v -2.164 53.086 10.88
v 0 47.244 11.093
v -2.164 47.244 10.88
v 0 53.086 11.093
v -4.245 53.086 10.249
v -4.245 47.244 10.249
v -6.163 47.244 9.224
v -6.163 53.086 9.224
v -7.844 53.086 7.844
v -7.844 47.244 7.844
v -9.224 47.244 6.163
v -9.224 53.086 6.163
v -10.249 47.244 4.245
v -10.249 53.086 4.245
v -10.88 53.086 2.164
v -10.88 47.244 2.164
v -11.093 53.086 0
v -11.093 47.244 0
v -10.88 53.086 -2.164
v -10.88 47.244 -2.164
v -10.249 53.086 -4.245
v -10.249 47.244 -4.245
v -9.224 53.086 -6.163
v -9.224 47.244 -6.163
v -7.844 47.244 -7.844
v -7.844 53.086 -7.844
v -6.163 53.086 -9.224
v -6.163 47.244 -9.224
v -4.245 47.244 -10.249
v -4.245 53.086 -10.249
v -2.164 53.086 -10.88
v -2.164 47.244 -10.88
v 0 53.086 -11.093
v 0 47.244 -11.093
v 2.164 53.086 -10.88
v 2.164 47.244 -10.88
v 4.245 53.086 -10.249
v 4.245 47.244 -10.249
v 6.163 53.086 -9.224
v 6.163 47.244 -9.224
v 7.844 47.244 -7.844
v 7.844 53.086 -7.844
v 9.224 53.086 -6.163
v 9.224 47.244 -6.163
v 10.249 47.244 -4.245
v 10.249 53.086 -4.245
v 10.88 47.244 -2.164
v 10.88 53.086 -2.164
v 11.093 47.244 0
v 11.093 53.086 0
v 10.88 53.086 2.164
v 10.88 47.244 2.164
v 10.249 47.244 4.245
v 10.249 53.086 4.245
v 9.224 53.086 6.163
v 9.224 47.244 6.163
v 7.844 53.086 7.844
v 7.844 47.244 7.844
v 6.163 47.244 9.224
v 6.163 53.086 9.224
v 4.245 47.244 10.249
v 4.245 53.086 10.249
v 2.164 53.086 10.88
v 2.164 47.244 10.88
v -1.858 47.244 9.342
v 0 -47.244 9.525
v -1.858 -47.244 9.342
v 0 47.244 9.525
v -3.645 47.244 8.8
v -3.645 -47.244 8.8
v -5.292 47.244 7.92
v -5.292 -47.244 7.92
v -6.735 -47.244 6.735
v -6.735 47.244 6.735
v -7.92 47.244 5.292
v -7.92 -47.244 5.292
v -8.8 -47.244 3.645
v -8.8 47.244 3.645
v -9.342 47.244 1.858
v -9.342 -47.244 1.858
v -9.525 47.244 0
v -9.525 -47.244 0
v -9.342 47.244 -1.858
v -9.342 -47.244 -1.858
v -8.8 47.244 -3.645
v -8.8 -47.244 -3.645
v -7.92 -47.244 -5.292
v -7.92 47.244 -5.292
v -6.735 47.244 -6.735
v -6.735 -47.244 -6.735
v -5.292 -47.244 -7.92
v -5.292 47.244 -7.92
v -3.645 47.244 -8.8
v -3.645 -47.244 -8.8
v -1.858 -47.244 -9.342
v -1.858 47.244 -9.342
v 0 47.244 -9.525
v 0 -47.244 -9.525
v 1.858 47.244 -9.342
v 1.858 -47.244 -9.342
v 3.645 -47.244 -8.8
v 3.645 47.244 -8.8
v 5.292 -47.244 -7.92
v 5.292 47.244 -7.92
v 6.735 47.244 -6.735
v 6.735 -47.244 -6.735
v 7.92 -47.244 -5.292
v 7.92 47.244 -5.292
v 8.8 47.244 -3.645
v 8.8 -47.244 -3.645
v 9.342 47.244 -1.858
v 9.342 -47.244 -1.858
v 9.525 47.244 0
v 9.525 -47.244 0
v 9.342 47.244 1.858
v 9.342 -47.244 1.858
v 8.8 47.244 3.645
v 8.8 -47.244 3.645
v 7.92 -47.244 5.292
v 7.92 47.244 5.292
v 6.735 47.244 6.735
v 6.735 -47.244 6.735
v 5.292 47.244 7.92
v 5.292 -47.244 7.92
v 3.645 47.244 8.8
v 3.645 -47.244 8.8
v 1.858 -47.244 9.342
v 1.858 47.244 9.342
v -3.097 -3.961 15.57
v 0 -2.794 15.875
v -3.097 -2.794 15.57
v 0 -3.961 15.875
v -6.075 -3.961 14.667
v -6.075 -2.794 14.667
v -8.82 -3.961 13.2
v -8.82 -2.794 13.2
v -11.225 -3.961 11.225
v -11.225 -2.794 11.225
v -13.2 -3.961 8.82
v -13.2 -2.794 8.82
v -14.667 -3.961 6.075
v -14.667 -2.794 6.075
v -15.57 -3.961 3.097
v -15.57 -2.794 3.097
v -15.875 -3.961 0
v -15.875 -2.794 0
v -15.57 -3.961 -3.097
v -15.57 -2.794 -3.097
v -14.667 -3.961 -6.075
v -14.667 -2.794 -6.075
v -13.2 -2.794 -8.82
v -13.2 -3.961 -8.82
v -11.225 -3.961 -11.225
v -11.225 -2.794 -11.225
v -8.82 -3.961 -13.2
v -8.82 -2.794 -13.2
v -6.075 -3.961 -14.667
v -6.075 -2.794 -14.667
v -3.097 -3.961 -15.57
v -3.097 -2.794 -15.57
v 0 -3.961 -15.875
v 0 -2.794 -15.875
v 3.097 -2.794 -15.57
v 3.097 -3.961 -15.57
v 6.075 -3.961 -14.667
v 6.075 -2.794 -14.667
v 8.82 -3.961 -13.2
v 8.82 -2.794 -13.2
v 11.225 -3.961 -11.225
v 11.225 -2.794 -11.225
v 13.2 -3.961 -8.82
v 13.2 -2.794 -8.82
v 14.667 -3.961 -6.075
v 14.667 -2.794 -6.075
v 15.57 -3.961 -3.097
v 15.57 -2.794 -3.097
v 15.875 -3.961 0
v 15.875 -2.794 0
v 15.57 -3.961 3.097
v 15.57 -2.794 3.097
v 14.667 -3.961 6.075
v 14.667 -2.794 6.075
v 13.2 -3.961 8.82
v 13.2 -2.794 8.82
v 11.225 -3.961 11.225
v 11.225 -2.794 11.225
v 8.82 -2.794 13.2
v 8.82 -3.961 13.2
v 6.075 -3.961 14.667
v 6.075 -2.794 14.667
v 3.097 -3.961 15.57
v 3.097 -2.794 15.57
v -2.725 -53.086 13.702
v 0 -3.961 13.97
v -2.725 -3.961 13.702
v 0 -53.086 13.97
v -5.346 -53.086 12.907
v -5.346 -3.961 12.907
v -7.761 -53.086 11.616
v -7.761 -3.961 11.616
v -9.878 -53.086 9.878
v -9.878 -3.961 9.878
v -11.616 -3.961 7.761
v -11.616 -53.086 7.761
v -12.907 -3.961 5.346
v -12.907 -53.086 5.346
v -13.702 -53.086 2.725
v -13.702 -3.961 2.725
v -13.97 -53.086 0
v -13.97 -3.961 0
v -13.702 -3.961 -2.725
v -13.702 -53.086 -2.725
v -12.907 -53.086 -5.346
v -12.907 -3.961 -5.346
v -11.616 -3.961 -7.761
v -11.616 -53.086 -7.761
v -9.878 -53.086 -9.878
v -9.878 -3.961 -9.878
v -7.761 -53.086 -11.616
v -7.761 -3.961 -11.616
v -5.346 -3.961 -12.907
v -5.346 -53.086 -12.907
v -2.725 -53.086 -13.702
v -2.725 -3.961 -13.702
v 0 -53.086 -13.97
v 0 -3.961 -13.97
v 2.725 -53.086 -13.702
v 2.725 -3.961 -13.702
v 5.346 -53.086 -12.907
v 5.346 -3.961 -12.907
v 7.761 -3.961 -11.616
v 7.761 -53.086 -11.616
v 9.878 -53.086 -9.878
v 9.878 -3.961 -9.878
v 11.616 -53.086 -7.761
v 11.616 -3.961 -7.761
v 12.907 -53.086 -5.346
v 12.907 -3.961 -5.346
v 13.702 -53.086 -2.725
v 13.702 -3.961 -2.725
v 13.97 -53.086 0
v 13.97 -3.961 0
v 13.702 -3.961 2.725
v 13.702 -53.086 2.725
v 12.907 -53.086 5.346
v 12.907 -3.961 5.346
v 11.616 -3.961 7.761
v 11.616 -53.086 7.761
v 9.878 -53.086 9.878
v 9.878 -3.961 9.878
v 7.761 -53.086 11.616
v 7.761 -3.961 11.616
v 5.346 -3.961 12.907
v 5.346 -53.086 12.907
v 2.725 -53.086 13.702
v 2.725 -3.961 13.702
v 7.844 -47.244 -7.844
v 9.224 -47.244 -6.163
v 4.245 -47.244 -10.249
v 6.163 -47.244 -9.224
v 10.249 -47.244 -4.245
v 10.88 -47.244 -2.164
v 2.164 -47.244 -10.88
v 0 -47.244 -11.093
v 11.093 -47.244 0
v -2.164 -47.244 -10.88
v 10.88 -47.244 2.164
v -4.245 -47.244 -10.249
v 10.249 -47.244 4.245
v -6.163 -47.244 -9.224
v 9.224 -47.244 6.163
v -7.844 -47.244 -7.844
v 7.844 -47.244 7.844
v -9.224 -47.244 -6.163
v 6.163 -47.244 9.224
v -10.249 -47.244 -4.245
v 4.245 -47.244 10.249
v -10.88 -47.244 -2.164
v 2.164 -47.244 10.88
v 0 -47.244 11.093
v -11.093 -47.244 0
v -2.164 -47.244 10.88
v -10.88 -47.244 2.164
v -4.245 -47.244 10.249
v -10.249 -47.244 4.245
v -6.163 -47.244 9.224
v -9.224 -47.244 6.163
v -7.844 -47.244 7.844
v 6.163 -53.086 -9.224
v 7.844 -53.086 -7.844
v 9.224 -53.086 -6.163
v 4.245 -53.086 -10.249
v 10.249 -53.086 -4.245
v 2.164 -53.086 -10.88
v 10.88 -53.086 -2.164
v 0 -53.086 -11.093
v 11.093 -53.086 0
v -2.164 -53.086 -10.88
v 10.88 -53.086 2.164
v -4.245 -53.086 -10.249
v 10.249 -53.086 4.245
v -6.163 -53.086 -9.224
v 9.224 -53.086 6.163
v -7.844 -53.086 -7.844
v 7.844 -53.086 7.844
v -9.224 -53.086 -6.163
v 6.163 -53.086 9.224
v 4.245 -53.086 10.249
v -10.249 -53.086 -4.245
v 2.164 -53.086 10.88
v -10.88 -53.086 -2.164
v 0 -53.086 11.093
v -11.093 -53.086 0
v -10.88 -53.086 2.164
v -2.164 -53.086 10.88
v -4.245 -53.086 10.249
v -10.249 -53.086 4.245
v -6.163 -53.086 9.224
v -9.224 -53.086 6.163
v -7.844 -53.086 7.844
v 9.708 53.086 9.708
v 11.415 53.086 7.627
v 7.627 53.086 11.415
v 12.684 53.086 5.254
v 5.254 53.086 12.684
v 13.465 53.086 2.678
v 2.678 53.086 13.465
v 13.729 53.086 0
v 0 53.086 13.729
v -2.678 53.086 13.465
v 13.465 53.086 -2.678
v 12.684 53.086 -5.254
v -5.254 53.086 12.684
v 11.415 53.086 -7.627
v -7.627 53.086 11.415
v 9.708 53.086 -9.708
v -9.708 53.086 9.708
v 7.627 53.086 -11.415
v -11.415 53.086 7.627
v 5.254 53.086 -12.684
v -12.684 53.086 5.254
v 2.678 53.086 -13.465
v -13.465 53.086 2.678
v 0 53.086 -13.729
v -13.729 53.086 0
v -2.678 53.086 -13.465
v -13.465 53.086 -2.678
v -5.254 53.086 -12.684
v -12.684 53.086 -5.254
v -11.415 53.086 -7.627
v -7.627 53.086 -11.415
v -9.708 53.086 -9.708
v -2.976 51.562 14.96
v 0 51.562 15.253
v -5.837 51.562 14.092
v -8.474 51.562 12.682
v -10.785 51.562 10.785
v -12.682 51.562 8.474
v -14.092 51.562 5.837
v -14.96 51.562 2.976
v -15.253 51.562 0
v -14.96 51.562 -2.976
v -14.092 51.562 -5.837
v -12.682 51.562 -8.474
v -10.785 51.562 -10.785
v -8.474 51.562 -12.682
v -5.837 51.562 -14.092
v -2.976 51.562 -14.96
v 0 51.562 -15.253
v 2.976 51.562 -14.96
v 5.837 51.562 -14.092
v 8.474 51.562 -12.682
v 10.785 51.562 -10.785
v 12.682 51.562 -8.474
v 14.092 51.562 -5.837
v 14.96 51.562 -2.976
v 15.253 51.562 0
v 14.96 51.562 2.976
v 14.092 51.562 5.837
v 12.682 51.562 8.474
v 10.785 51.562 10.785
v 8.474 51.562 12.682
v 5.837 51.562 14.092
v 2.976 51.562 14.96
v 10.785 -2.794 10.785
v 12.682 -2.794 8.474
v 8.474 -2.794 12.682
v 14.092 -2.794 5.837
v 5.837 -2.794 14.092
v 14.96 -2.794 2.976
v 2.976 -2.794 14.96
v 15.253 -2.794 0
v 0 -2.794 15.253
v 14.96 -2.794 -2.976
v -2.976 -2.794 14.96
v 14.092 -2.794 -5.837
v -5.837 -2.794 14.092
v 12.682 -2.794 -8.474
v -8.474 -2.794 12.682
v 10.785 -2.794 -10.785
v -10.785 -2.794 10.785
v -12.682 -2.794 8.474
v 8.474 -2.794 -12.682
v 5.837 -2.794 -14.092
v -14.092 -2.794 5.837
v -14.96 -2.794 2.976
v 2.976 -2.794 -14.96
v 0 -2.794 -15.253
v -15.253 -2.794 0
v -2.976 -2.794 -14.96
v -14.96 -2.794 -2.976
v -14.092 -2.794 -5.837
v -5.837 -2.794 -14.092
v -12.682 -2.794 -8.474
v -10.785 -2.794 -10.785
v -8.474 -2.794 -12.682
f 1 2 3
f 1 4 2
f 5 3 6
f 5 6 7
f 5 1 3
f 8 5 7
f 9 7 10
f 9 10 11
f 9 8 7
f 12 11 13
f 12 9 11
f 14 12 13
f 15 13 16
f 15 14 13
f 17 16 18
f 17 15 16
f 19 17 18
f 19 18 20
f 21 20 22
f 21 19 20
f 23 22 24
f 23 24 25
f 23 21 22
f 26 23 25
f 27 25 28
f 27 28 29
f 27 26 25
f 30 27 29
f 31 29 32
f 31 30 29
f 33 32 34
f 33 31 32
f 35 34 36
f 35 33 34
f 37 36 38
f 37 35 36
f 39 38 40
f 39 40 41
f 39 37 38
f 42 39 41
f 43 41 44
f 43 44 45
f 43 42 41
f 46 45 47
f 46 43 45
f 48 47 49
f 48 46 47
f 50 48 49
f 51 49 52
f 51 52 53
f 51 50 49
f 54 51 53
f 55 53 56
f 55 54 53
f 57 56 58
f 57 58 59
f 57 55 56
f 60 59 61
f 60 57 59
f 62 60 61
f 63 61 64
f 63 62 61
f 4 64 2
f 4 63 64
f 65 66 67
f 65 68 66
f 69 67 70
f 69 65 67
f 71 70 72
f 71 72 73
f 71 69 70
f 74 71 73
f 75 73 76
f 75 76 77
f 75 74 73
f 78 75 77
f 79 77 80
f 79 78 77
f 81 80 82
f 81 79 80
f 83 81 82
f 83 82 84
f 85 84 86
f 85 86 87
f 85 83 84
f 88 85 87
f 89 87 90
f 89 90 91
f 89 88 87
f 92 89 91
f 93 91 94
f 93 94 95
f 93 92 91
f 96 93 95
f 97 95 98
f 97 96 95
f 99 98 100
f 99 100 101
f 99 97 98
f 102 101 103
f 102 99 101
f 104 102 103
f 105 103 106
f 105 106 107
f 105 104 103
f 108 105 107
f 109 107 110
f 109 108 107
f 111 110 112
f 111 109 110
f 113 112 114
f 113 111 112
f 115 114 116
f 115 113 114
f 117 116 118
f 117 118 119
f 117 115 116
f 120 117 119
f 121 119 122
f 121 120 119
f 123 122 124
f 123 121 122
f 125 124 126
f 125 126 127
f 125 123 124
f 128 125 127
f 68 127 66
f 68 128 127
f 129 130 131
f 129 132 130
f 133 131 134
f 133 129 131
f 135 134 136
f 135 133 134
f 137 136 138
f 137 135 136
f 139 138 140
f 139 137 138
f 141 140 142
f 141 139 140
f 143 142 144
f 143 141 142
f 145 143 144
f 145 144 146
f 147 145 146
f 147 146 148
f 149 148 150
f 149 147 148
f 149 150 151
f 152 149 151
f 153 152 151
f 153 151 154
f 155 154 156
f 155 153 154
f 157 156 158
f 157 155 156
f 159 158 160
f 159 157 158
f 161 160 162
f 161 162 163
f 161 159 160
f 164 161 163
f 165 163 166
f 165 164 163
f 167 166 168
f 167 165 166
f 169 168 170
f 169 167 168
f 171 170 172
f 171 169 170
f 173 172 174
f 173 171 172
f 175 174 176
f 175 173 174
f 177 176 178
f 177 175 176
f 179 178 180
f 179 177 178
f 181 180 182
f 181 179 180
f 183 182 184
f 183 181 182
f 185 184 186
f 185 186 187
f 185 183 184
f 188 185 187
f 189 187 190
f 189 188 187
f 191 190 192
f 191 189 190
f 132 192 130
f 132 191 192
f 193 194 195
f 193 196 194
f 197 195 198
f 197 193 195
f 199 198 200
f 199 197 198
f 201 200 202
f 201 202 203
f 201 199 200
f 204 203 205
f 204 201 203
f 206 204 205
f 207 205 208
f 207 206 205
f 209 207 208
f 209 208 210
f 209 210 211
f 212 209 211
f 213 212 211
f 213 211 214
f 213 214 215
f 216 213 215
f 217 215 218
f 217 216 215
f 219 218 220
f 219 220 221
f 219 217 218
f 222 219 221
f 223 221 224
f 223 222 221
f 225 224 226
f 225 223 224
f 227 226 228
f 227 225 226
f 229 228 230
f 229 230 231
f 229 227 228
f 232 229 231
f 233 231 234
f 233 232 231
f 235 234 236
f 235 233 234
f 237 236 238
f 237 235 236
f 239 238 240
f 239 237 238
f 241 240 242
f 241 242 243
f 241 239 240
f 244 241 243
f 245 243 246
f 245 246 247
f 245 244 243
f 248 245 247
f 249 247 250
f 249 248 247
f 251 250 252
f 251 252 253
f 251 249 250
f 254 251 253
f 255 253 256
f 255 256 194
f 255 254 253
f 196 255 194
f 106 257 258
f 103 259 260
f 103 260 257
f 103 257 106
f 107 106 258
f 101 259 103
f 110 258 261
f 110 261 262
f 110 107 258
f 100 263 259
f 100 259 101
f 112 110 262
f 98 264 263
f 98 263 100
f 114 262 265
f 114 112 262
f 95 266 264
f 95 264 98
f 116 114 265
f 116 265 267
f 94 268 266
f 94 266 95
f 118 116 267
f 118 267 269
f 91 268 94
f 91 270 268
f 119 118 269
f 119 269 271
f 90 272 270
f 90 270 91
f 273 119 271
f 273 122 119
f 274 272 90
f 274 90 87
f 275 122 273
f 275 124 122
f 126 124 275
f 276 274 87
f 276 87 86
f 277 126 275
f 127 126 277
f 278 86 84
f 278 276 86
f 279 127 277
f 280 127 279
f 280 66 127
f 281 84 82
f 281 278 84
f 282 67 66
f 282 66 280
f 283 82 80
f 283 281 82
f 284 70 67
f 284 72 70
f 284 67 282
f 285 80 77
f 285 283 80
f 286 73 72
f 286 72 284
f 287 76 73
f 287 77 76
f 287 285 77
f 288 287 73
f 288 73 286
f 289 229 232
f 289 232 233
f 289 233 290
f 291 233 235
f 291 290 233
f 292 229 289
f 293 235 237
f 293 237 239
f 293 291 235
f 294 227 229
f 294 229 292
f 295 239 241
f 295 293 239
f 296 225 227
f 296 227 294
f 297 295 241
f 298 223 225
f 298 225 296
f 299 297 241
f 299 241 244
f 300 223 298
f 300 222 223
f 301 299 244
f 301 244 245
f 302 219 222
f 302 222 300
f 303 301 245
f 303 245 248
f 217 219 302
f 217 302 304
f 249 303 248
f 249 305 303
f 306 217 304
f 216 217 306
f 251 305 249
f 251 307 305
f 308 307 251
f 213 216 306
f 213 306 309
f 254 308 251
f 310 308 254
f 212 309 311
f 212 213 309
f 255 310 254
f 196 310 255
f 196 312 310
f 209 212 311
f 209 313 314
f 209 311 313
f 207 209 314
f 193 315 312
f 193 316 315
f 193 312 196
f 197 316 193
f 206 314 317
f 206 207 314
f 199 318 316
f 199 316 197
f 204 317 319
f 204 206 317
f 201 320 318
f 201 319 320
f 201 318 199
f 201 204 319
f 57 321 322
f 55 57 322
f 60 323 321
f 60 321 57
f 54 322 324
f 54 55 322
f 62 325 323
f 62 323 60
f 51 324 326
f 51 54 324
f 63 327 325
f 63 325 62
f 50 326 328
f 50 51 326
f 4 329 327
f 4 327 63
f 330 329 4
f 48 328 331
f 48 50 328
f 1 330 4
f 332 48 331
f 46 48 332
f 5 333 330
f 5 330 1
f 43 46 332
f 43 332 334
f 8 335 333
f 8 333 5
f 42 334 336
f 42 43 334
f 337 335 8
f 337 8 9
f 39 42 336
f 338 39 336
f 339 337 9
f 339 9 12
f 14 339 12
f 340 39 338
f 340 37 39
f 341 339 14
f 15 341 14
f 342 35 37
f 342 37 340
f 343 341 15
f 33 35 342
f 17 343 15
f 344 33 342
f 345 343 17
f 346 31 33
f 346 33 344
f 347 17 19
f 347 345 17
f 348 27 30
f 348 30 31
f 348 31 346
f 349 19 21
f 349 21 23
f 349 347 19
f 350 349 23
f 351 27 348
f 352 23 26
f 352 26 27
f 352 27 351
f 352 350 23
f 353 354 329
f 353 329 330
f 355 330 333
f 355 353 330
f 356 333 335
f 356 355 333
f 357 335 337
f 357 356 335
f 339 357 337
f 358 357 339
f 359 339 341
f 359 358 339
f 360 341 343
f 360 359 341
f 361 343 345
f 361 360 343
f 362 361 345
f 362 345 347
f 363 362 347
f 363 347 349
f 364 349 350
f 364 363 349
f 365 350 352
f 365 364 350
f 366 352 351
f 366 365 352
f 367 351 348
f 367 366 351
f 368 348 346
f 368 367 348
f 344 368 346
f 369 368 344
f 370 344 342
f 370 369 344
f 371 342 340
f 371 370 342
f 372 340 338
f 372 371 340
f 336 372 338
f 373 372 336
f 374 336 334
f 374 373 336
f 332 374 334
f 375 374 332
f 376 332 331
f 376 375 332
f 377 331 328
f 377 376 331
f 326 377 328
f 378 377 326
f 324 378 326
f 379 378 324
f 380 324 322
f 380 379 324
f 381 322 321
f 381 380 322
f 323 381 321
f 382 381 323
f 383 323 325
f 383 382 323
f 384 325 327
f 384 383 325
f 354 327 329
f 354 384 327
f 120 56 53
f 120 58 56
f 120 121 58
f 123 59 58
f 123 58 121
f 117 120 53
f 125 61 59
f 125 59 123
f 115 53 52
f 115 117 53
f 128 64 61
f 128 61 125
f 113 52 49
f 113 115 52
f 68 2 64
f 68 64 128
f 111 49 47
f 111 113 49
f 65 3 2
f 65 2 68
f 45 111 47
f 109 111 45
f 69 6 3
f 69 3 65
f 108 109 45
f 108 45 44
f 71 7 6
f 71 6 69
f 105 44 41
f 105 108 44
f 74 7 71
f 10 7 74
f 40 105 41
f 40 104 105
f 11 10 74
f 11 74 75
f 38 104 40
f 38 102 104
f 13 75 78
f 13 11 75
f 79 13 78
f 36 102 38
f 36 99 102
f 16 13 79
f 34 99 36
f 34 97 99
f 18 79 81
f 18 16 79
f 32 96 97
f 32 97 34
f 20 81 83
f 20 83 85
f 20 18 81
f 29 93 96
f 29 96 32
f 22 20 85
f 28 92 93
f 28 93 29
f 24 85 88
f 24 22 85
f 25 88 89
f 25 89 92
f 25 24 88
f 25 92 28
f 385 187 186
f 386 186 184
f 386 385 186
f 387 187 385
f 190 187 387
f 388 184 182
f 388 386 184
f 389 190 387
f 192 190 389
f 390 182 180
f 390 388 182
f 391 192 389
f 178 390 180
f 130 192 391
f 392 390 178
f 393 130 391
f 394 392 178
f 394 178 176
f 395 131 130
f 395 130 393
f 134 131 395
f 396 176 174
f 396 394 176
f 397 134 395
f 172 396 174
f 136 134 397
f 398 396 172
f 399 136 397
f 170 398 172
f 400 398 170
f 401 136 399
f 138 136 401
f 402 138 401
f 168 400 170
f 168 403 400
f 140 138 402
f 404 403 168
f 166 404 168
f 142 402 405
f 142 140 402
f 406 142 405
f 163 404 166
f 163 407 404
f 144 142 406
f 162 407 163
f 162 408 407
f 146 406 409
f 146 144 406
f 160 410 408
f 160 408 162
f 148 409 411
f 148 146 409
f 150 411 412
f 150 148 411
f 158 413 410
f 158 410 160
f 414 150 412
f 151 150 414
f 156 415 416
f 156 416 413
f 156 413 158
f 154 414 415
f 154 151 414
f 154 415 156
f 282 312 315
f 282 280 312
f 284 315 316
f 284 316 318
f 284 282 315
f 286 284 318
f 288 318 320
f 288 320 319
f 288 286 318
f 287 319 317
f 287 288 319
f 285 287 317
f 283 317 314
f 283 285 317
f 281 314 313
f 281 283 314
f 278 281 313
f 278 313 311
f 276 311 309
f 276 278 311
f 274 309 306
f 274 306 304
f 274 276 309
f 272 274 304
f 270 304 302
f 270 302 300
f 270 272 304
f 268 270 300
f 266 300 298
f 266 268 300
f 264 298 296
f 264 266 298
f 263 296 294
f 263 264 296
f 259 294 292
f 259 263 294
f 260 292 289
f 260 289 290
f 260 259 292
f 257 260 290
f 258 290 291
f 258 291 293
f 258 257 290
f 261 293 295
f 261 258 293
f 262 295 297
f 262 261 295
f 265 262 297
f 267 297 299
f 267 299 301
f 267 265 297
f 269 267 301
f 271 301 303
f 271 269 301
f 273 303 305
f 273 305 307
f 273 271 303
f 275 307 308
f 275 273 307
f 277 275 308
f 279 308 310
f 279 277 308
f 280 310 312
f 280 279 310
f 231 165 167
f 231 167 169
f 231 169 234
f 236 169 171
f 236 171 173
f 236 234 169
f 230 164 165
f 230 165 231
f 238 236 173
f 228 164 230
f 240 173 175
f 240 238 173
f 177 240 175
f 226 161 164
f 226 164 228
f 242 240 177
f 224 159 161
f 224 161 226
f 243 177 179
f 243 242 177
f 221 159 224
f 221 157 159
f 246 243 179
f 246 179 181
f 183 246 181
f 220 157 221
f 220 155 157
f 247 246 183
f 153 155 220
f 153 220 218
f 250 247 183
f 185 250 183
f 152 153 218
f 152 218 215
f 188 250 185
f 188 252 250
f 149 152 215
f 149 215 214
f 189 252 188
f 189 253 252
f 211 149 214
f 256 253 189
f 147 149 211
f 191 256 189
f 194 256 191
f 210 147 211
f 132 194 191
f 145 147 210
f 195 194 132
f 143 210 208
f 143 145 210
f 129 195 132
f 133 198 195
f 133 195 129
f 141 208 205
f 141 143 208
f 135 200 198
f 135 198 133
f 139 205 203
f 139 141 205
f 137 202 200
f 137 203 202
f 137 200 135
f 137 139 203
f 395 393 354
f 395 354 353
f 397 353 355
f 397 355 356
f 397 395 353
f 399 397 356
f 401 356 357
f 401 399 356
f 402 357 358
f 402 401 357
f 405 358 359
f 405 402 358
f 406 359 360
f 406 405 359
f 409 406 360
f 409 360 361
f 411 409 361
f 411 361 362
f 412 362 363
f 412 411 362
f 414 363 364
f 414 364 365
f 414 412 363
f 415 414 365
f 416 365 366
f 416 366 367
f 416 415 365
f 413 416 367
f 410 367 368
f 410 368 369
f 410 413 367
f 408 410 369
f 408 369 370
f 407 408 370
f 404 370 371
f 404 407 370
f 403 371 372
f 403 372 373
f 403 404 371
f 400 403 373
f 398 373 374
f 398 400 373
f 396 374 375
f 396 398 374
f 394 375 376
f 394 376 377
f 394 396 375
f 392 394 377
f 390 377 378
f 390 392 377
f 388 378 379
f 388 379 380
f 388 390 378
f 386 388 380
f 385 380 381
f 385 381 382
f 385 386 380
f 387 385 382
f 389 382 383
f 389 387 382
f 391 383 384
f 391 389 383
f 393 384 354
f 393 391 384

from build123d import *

# Parameters (mm, degrees)
CHAMFER1_SIZE = 1.524


with BuildPart() as part:
    # Sketch1 → Revolve1 (revolve)
    with BuildSketch(Plane(origin=(0, 0, 0), x_dir=(0, 0, -1), z_dir=(1, 0, 0)), mode=Mode.PRIVATE) as revolve1_sk:
        Polygon((11.09345, -53.086), (11.09345, -47.244), (9.525, -47.244), (9.525, 47.244), (11.09345, 47.244), (11.09345, 53.086), (15.2527, 53.086), (15.2527, -2.794000024), (15.875, -2.794000024), (15.875, -3.961), (13.97, -3.961), (13.97, -53.086), align=None)
    revolve(revolve1_sk.sketch.rotate(Axis((0, 53.086, 0), (0, -1, 0)), 180), axis=Axis((0, 53.086, 0), (0, -1, 0)))

    # Chamfer1
    chamfer1_edges = [part.edges().sort_by_distance(p)[0] for p in [
        (0, 53.086, -15.2527),
    ]]
    chamfer(chamfer1_edges, length=CHAMFER1_SIZE)


solid = part.part
